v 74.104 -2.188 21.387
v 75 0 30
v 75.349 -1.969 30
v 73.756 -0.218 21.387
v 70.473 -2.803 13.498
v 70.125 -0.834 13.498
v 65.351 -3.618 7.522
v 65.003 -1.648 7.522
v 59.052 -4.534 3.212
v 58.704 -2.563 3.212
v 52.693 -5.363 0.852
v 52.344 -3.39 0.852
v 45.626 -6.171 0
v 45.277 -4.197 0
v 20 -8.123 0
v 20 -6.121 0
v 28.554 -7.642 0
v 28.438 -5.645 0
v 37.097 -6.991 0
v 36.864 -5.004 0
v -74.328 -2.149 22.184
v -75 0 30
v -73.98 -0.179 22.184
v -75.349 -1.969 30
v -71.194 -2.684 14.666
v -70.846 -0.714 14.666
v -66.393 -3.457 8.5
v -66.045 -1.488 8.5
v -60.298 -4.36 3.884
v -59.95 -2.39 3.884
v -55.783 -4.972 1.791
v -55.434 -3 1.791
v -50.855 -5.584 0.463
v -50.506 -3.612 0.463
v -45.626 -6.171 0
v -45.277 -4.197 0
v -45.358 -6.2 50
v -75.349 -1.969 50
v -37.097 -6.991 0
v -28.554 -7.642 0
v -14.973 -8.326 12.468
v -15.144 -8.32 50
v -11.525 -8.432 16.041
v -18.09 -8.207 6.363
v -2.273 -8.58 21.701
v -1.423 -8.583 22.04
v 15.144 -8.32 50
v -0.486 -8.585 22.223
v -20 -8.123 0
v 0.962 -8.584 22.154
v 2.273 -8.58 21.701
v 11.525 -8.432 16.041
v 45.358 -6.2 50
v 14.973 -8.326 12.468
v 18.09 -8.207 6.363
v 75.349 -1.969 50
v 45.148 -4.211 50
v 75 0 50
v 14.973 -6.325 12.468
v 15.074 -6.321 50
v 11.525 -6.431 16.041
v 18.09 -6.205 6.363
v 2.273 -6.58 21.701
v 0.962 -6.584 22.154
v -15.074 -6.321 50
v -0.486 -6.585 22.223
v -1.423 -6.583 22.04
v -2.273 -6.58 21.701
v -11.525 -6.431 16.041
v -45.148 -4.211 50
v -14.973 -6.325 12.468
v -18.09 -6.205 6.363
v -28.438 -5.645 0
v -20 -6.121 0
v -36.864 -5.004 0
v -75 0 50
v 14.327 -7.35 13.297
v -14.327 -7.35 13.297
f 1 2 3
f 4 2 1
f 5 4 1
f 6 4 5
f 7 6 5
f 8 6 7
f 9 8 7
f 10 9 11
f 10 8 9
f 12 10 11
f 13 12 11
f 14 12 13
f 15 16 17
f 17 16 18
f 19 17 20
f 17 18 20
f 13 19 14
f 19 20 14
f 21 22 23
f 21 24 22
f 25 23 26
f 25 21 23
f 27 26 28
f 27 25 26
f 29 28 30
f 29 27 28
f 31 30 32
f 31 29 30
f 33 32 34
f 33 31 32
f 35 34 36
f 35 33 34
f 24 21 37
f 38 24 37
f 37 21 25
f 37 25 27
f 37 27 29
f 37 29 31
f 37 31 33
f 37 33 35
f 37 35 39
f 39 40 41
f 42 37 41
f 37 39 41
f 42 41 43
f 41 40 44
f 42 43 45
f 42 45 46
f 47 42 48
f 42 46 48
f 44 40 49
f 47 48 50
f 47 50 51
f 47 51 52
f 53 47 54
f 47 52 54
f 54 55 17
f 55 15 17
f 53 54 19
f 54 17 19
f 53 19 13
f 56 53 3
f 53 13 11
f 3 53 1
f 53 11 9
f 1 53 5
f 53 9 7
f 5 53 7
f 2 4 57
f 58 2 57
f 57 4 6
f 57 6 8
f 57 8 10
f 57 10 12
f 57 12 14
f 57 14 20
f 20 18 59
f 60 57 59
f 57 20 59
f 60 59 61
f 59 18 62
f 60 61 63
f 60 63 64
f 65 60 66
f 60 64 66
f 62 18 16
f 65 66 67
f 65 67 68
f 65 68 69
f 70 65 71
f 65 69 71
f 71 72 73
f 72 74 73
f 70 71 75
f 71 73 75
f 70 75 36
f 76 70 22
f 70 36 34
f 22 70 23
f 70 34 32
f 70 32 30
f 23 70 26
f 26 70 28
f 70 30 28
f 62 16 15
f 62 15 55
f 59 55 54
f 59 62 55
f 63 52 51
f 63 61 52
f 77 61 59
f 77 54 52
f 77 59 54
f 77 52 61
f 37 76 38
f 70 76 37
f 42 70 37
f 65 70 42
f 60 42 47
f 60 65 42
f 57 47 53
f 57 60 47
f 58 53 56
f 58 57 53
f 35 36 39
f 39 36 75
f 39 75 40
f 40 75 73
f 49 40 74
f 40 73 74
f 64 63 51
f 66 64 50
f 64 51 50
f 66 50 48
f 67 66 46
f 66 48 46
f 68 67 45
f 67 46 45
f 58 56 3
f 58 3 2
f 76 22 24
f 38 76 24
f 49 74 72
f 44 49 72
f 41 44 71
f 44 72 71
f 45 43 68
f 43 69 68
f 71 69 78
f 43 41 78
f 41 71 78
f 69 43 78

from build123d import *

# Parameters (mm, degrees)
F1_DEPTH = 50
F2_R     = 30
F4_DEPTH = 9.585521368
F5_R     = 5


with BuildPart() as f1:
    # F0 (on Top) → F1 (new body)
    with BuildSketch(Plane.XY):
        with BuildLine():
            ThreePointArc((75, 0), (0, -6.585521268), (-75, 0))
            Line((-75, 0), (-75.3485405324, -1.9693957188))
            ThreePointArc((-75.3485405324, -1.9693957188), (0, -8.585521268), (75.3485405324, -1.9693957188))
            Line((75.3485405324, -1.9693957188), (75, 0))
        make_face()
    extrude(amount=F1_DEPTH)

    # F2
    f2_edges = [f1.edges().sort_by_distance(p)[0] for p in [
        (75.17427, -0.984698, 0),
        (-75.17427, -0.984698, 0),
    ]]
    fillet(f2_edges, radius=F2_R)

    # F3 (on Front) → F4 (cut, up to face)
    with BuildSketch(Plane.XZ):
        with BuildLine():
            Line((-20, 0), (0, 0))
            Line((0, 0), (20, 0))
            add(Edge.make_bspline(
                [(20, 0), (18.7029346188, 4.7944349411), (15.9903043356, 14.8213230228), (5.4831015914, 20.0955088265), (0, 22.8478014469)],
                knots=[0, 0, 0, 0, 0.4781578195, 1, 1, 1, 1], degree=3))
            add(Edge.make_bspline(
                [(-20, 0), (-18.7029346188, 4.7944349411), (-15.9903043356, 14.8213230228), (-5.4831015914, 20.0955088265), (0, 22.8478014469)],
                knots=[0, 0, 0, 0, 0.4781578195, 1, 1, 1, 1], degree=3))
        make_face()
    extrude(amount=F4_DEPTH, mode=Mode.SUBTRACT)

    # F5
    f5_edges = [f1.edges().sort_by_distance(p)[0] for p in [
        (0, -7.585521, 22.847801),
    ]]
    fillet(f5_edges, radius=F5_R)


solid = f1.part
